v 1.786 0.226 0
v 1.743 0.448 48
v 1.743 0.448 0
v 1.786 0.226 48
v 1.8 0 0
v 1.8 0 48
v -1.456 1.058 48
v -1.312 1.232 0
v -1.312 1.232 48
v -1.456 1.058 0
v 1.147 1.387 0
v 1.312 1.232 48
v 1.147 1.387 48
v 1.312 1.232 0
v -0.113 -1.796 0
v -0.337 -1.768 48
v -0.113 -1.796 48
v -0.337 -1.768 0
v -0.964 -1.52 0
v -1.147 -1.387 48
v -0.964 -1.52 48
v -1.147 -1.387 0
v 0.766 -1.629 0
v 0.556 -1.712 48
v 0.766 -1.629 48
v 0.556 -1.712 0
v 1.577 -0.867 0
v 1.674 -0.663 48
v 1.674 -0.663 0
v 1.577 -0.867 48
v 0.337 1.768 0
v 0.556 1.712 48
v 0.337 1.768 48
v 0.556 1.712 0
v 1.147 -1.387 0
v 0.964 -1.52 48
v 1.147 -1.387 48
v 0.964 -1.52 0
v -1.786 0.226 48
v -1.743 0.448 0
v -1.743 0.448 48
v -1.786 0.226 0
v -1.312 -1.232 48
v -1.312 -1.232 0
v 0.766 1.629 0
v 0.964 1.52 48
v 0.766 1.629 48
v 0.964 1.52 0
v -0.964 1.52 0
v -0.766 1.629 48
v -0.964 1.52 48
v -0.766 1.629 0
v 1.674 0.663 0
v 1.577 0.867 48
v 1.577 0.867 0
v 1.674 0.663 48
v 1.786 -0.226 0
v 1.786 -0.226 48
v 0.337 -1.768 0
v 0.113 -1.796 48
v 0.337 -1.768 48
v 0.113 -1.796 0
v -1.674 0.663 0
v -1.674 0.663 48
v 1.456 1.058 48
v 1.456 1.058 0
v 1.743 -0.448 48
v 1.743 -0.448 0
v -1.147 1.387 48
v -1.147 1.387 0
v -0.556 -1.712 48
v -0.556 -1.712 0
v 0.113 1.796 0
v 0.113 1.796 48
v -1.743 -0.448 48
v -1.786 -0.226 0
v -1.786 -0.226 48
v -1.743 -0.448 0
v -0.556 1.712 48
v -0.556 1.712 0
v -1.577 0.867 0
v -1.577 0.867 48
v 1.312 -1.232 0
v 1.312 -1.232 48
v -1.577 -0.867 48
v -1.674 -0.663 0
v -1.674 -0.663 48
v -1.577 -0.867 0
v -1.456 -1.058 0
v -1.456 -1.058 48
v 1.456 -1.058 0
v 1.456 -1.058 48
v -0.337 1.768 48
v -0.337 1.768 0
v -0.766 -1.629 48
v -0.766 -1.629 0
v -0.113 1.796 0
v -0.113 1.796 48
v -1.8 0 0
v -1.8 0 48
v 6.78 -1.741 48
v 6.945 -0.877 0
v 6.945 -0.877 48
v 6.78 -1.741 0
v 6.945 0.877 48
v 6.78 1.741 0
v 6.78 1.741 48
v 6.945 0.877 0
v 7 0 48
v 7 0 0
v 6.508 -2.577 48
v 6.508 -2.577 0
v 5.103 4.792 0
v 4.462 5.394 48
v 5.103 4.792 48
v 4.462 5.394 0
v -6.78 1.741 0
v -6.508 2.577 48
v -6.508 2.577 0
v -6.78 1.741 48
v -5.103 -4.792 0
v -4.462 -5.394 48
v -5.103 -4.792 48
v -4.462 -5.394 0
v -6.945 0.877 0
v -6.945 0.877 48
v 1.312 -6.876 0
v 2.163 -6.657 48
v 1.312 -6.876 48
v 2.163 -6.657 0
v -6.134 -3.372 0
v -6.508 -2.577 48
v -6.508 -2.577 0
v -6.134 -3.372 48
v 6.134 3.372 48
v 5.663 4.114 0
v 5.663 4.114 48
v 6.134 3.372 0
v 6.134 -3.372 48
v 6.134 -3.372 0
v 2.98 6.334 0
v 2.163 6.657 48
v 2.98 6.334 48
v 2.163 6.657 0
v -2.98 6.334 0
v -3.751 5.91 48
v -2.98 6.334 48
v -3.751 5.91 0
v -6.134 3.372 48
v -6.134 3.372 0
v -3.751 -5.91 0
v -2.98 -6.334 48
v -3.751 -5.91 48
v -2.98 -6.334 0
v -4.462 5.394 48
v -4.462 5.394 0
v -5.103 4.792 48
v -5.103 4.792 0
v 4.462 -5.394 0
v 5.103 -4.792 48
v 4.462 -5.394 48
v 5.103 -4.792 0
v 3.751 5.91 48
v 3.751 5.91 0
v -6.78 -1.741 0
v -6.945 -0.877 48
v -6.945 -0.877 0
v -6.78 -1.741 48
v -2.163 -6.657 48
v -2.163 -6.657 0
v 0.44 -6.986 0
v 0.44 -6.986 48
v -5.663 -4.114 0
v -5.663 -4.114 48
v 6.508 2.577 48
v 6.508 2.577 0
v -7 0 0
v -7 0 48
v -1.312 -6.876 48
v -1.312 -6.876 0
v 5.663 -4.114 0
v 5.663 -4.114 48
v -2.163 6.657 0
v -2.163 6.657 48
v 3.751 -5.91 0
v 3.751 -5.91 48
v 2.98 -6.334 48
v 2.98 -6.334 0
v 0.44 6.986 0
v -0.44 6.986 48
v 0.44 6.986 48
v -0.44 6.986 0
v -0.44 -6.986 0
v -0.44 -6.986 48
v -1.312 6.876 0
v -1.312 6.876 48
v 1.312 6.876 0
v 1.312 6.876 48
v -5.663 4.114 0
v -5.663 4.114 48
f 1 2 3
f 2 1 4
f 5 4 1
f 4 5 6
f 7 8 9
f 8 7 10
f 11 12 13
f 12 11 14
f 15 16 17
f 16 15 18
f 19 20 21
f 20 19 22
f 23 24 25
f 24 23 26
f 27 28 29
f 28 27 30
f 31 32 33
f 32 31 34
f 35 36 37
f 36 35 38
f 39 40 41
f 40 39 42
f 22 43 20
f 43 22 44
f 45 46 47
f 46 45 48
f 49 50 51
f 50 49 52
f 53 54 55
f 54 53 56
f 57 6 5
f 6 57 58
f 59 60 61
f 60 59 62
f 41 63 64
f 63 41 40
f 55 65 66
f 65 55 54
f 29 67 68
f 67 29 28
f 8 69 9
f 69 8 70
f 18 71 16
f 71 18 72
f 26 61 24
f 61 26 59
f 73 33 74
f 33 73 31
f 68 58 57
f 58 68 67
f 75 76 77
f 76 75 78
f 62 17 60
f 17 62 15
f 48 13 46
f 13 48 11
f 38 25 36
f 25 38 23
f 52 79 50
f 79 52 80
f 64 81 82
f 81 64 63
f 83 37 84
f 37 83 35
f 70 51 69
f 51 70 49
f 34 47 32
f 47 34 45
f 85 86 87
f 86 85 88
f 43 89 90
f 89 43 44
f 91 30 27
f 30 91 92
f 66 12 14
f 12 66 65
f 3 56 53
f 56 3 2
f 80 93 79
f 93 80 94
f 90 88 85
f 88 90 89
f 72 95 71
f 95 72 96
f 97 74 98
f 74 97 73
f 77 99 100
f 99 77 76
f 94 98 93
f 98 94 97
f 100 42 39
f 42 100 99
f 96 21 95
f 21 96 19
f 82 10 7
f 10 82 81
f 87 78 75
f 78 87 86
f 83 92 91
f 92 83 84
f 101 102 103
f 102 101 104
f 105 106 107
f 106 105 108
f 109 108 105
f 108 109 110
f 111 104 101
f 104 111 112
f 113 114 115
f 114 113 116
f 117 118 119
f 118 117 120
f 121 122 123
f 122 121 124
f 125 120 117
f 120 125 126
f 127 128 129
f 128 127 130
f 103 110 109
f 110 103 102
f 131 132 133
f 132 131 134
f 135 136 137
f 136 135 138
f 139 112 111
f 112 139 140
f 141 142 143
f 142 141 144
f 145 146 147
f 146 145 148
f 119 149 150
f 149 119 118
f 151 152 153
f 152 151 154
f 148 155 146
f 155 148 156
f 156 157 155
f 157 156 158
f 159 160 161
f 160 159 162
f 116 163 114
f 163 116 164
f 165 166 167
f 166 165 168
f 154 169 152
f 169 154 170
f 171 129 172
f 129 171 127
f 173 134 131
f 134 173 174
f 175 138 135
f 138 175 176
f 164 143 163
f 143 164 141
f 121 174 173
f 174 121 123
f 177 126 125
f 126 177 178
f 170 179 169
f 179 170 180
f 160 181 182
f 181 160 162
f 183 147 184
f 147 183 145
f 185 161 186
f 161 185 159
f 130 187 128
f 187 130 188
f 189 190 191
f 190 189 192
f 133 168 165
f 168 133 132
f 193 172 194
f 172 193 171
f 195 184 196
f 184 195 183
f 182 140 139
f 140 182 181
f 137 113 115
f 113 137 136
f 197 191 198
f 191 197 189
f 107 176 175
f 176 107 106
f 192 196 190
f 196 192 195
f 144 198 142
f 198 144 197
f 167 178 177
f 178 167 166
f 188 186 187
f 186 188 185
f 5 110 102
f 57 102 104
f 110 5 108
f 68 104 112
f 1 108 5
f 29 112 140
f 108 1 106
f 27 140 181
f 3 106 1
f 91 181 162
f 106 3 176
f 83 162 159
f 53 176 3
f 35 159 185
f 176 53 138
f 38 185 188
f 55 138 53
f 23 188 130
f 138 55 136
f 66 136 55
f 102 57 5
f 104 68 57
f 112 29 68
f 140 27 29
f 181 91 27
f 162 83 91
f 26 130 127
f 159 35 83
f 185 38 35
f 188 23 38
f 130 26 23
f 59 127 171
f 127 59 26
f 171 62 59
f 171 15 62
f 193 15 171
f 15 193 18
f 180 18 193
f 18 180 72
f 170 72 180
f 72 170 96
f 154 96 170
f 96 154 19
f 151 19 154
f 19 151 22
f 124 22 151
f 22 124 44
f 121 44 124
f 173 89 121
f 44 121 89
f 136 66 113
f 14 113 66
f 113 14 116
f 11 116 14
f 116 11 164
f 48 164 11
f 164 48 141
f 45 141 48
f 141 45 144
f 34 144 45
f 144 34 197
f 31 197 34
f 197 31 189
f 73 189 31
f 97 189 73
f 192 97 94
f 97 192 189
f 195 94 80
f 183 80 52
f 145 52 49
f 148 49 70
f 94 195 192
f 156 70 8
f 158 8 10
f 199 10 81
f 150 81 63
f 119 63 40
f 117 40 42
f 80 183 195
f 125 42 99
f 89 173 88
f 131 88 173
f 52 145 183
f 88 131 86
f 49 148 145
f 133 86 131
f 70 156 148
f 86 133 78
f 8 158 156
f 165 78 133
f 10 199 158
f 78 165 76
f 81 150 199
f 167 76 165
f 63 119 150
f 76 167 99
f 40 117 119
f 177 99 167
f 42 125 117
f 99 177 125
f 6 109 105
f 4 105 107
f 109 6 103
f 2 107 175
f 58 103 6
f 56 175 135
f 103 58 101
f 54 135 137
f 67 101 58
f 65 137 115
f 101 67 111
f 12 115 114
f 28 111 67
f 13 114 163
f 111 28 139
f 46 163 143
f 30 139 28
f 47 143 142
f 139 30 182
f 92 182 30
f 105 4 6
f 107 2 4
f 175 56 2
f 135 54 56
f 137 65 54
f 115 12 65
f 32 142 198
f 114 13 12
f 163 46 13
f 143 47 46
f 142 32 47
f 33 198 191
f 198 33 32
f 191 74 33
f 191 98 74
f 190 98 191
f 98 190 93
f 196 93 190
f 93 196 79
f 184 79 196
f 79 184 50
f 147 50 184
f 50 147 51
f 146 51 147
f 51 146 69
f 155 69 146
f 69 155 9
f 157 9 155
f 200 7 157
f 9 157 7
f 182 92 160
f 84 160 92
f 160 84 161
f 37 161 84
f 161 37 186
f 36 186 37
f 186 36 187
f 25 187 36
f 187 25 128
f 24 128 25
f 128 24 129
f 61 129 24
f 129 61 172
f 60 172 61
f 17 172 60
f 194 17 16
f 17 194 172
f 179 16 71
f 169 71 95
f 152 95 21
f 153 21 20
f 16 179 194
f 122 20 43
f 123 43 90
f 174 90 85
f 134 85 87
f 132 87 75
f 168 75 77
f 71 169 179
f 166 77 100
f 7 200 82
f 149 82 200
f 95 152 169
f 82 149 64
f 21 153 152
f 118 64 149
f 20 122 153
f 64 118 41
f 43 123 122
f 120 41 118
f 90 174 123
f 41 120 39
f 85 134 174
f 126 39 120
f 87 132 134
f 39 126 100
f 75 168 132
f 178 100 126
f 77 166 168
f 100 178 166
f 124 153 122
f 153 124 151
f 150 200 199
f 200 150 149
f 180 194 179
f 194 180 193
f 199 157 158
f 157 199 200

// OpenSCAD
$fn = 50;


difference() {
	union() {
		cylinder(h = 48, r = 7.0000000000);
	}
	union() {
		translate(v = [0, 0, -100]) {
			cylinder(h = 200, r = 1.8000000000);
		}
		translate(v = [0, 0, -100]) {
			cylinder(h = 200, r = 1.8000000000);
		}
	}
}
